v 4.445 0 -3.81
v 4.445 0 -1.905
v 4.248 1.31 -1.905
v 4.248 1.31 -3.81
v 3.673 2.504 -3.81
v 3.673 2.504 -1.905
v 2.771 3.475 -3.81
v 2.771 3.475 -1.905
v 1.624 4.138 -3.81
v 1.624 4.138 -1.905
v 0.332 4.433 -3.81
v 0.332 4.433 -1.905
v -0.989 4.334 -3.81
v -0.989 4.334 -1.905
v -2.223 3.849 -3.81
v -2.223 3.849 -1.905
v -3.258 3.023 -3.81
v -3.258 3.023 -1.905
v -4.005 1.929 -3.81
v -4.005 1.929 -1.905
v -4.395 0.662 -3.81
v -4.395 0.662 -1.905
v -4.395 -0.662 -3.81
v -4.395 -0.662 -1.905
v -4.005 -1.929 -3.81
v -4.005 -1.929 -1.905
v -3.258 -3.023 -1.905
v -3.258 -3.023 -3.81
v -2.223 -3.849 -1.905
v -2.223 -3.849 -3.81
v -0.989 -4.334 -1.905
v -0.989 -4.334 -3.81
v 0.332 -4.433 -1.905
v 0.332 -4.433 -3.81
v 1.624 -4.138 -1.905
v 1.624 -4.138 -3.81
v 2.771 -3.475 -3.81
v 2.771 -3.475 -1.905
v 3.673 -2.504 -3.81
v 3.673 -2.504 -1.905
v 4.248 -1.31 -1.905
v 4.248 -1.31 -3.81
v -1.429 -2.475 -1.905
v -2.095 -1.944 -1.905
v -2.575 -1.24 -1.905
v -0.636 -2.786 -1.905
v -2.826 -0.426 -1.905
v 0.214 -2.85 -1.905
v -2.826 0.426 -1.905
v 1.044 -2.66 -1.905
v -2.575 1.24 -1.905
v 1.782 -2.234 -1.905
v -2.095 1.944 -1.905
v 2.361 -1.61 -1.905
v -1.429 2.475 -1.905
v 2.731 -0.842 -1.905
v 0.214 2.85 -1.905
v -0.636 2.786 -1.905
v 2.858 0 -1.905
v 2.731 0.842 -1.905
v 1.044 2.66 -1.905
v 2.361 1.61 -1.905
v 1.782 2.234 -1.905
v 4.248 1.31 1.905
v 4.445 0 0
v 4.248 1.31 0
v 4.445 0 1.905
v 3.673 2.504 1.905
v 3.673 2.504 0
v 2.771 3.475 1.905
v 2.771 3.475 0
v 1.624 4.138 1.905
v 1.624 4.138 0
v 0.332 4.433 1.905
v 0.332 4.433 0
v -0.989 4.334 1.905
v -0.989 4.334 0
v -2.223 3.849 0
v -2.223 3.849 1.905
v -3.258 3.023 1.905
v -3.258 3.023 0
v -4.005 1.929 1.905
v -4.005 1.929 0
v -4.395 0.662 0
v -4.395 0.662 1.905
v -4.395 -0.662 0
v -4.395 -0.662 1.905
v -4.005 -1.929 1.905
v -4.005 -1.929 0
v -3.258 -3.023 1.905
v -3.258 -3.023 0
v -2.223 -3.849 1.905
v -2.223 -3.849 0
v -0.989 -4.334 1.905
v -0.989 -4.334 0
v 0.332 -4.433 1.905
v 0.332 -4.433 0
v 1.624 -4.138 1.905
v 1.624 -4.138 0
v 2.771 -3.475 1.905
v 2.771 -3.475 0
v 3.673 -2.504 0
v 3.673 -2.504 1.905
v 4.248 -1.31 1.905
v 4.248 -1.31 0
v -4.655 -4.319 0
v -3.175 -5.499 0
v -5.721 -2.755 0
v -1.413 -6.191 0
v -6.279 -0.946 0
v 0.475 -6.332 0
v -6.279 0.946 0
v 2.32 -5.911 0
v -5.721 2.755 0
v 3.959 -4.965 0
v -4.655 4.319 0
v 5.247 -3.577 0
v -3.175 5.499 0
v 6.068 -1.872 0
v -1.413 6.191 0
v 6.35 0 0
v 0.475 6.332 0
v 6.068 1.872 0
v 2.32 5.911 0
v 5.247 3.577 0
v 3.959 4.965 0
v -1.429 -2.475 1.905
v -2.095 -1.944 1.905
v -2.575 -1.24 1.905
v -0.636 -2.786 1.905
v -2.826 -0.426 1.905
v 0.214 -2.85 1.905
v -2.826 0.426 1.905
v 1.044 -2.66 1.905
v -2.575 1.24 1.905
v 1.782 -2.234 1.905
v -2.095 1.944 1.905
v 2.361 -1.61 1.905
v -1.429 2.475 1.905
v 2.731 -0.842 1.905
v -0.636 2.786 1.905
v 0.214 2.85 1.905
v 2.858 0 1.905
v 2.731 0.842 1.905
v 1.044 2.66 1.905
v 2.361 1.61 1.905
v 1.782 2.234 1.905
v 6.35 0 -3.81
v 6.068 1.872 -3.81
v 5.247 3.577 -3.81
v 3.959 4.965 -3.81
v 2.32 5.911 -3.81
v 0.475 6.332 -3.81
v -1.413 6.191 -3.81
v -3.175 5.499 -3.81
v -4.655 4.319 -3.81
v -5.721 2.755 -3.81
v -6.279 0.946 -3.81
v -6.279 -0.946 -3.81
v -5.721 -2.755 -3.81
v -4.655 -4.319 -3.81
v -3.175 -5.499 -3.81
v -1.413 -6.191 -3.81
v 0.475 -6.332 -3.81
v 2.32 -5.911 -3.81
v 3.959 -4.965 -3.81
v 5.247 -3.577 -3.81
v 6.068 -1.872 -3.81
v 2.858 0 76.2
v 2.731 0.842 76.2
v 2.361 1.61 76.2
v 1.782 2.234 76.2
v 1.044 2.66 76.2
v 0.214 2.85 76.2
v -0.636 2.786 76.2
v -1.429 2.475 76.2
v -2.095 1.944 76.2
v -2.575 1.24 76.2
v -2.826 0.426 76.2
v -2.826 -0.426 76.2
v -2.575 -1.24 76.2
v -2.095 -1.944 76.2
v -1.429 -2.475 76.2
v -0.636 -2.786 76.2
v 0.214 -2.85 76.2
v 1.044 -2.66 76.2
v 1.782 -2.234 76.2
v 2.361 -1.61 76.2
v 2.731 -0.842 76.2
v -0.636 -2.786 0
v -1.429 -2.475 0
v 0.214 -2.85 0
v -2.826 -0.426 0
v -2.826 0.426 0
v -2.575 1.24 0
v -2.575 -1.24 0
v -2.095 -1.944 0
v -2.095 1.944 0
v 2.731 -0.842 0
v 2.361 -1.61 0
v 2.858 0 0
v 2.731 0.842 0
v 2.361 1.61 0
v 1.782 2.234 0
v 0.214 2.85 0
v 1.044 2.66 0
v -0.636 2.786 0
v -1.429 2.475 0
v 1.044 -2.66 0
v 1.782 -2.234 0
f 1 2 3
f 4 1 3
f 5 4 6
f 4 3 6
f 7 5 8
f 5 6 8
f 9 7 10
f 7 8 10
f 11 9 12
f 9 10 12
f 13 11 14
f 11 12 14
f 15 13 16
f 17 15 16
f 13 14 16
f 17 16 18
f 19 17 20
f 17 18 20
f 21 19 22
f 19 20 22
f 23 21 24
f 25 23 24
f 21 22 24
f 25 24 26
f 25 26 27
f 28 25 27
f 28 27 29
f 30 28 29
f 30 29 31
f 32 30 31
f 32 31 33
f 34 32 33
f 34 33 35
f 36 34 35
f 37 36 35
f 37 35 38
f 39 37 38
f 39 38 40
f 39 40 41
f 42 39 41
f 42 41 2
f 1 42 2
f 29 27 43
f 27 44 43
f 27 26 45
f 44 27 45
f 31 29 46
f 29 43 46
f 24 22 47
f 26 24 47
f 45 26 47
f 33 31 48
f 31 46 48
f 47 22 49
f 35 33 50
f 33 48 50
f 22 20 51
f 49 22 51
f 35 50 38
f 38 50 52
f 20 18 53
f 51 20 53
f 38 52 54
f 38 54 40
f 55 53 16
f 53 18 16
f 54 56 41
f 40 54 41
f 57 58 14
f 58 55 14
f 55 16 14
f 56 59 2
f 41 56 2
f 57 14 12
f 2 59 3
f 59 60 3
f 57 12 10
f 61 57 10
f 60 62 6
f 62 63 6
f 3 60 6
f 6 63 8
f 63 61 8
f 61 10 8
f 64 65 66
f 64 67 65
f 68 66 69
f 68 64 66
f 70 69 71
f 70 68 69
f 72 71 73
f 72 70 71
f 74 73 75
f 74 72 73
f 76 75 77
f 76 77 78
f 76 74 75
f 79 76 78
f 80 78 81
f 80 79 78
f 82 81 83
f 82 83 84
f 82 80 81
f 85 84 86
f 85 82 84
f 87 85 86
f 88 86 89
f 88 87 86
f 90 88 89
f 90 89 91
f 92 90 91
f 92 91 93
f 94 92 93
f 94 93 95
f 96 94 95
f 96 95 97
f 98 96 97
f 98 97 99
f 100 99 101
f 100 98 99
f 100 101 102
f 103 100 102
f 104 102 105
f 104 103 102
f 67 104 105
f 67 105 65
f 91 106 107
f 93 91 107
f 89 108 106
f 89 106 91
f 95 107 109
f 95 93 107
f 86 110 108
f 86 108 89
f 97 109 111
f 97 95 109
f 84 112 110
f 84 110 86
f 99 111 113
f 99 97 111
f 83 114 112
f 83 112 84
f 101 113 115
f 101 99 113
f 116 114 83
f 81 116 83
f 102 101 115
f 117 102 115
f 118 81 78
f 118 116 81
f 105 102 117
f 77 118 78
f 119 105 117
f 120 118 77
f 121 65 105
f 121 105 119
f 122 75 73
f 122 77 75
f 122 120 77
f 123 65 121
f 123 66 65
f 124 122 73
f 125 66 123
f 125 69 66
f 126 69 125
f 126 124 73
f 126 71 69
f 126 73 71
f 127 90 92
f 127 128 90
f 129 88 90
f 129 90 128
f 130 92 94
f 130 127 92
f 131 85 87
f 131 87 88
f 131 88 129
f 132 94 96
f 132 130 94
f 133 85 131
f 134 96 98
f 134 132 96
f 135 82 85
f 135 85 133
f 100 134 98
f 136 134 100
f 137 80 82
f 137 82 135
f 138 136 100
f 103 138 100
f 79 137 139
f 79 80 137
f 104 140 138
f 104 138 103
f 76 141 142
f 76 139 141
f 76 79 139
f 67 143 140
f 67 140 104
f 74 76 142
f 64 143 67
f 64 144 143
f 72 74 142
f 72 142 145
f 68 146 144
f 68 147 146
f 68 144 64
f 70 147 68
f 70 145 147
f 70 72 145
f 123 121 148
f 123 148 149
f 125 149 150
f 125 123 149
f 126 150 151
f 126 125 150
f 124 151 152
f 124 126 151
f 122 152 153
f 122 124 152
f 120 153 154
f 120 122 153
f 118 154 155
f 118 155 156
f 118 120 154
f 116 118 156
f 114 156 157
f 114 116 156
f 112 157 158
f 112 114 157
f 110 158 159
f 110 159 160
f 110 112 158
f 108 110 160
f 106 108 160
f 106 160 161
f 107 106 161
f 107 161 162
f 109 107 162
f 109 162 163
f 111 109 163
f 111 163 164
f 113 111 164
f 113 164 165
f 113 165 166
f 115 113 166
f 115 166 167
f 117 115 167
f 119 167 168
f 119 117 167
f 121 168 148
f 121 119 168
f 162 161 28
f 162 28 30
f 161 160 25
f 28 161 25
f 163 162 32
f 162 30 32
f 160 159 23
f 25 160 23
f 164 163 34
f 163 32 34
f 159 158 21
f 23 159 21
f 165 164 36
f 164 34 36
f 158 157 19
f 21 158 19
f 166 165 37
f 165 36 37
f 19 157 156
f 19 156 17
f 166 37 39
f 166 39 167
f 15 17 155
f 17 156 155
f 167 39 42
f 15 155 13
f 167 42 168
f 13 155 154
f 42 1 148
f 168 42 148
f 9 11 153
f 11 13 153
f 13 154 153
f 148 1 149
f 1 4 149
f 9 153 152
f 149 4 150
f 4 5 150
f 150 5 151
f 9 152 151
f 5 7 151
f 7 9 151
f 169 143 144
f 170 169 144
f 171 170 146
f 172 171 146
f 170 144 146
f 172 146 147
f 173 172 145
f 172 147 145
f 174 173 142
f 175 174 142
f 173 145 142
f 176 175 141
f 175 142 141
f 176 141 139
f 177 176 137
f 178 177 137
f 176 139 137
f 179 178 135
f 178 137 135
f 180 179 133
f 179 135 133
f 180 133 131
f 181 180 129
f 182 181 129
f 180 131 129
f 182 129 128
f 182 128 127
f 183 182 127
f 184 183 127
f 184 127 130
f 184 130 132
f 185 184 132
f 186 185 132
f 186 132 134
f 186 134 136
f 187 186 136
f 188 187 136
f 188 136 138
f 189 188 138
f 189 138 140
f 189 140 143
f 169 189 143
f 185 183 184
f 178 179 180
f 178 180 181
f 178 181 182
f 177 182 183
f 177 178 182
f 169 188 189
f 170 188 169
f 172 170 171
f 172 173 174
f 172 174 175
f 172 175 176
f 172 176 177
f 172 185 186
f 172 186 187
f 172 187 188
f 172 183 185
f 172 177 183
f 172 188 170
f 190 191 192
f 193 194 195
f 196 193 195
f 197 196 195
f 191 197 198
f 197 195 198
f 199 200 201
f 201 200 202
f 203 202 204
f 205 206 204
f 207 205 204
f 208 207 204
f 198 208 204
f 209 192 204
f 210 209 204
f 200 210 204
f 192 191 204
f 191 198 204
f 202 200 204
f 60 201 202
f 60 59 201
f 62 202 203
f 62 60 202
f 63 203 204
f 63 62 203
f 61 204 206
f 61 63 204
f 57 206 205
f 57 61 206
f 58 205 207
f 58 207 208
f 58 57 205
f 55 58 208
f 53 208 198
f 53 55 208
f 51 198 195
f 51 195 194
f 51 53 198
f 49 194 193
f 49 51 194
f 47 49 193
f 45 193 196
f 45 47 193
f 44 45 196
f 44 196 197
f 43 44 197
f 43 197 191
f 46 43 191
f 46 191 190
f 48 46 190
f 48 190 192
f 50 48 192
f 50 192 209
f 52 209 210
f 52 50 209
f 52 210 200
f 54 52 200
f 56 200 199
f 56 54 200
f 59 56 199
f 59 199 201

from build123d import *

# Parameters (mm, degrees)
F0_R     = 2.8575
F1_DEPTH = 76.2
F0_R_2   = 4.445
F2_DEPTH = 1.905
F0_R_3   = 6.35
F3_DEPTH = 3.81


with BuildPart() as f1:
    # F0 (on Top) → F1 (new body)
    with BuildSketch(Plane.XY):
        Circle(F0_R)
    extrude(amount=F1_DEPTH)

    # F0 (on Top) → F2 (join, symmetric)
    with BuildSketch(Plane.XY):
        Circle(F0_R_2)
        Circle(F0_R, mode=Mode.SUBTRACT)
    extrude(amount=F2_DEPTH, both=True)

    # F0 (on Top) → F3 (join)
    with BuildSketch(Plane.XY):
        Circle(F0_R_3)
        Circle(F0_R_2, mode=Mode.SUBTRACT)
    extrude(amount=-F3_DEPTH)


solid = f1.part
